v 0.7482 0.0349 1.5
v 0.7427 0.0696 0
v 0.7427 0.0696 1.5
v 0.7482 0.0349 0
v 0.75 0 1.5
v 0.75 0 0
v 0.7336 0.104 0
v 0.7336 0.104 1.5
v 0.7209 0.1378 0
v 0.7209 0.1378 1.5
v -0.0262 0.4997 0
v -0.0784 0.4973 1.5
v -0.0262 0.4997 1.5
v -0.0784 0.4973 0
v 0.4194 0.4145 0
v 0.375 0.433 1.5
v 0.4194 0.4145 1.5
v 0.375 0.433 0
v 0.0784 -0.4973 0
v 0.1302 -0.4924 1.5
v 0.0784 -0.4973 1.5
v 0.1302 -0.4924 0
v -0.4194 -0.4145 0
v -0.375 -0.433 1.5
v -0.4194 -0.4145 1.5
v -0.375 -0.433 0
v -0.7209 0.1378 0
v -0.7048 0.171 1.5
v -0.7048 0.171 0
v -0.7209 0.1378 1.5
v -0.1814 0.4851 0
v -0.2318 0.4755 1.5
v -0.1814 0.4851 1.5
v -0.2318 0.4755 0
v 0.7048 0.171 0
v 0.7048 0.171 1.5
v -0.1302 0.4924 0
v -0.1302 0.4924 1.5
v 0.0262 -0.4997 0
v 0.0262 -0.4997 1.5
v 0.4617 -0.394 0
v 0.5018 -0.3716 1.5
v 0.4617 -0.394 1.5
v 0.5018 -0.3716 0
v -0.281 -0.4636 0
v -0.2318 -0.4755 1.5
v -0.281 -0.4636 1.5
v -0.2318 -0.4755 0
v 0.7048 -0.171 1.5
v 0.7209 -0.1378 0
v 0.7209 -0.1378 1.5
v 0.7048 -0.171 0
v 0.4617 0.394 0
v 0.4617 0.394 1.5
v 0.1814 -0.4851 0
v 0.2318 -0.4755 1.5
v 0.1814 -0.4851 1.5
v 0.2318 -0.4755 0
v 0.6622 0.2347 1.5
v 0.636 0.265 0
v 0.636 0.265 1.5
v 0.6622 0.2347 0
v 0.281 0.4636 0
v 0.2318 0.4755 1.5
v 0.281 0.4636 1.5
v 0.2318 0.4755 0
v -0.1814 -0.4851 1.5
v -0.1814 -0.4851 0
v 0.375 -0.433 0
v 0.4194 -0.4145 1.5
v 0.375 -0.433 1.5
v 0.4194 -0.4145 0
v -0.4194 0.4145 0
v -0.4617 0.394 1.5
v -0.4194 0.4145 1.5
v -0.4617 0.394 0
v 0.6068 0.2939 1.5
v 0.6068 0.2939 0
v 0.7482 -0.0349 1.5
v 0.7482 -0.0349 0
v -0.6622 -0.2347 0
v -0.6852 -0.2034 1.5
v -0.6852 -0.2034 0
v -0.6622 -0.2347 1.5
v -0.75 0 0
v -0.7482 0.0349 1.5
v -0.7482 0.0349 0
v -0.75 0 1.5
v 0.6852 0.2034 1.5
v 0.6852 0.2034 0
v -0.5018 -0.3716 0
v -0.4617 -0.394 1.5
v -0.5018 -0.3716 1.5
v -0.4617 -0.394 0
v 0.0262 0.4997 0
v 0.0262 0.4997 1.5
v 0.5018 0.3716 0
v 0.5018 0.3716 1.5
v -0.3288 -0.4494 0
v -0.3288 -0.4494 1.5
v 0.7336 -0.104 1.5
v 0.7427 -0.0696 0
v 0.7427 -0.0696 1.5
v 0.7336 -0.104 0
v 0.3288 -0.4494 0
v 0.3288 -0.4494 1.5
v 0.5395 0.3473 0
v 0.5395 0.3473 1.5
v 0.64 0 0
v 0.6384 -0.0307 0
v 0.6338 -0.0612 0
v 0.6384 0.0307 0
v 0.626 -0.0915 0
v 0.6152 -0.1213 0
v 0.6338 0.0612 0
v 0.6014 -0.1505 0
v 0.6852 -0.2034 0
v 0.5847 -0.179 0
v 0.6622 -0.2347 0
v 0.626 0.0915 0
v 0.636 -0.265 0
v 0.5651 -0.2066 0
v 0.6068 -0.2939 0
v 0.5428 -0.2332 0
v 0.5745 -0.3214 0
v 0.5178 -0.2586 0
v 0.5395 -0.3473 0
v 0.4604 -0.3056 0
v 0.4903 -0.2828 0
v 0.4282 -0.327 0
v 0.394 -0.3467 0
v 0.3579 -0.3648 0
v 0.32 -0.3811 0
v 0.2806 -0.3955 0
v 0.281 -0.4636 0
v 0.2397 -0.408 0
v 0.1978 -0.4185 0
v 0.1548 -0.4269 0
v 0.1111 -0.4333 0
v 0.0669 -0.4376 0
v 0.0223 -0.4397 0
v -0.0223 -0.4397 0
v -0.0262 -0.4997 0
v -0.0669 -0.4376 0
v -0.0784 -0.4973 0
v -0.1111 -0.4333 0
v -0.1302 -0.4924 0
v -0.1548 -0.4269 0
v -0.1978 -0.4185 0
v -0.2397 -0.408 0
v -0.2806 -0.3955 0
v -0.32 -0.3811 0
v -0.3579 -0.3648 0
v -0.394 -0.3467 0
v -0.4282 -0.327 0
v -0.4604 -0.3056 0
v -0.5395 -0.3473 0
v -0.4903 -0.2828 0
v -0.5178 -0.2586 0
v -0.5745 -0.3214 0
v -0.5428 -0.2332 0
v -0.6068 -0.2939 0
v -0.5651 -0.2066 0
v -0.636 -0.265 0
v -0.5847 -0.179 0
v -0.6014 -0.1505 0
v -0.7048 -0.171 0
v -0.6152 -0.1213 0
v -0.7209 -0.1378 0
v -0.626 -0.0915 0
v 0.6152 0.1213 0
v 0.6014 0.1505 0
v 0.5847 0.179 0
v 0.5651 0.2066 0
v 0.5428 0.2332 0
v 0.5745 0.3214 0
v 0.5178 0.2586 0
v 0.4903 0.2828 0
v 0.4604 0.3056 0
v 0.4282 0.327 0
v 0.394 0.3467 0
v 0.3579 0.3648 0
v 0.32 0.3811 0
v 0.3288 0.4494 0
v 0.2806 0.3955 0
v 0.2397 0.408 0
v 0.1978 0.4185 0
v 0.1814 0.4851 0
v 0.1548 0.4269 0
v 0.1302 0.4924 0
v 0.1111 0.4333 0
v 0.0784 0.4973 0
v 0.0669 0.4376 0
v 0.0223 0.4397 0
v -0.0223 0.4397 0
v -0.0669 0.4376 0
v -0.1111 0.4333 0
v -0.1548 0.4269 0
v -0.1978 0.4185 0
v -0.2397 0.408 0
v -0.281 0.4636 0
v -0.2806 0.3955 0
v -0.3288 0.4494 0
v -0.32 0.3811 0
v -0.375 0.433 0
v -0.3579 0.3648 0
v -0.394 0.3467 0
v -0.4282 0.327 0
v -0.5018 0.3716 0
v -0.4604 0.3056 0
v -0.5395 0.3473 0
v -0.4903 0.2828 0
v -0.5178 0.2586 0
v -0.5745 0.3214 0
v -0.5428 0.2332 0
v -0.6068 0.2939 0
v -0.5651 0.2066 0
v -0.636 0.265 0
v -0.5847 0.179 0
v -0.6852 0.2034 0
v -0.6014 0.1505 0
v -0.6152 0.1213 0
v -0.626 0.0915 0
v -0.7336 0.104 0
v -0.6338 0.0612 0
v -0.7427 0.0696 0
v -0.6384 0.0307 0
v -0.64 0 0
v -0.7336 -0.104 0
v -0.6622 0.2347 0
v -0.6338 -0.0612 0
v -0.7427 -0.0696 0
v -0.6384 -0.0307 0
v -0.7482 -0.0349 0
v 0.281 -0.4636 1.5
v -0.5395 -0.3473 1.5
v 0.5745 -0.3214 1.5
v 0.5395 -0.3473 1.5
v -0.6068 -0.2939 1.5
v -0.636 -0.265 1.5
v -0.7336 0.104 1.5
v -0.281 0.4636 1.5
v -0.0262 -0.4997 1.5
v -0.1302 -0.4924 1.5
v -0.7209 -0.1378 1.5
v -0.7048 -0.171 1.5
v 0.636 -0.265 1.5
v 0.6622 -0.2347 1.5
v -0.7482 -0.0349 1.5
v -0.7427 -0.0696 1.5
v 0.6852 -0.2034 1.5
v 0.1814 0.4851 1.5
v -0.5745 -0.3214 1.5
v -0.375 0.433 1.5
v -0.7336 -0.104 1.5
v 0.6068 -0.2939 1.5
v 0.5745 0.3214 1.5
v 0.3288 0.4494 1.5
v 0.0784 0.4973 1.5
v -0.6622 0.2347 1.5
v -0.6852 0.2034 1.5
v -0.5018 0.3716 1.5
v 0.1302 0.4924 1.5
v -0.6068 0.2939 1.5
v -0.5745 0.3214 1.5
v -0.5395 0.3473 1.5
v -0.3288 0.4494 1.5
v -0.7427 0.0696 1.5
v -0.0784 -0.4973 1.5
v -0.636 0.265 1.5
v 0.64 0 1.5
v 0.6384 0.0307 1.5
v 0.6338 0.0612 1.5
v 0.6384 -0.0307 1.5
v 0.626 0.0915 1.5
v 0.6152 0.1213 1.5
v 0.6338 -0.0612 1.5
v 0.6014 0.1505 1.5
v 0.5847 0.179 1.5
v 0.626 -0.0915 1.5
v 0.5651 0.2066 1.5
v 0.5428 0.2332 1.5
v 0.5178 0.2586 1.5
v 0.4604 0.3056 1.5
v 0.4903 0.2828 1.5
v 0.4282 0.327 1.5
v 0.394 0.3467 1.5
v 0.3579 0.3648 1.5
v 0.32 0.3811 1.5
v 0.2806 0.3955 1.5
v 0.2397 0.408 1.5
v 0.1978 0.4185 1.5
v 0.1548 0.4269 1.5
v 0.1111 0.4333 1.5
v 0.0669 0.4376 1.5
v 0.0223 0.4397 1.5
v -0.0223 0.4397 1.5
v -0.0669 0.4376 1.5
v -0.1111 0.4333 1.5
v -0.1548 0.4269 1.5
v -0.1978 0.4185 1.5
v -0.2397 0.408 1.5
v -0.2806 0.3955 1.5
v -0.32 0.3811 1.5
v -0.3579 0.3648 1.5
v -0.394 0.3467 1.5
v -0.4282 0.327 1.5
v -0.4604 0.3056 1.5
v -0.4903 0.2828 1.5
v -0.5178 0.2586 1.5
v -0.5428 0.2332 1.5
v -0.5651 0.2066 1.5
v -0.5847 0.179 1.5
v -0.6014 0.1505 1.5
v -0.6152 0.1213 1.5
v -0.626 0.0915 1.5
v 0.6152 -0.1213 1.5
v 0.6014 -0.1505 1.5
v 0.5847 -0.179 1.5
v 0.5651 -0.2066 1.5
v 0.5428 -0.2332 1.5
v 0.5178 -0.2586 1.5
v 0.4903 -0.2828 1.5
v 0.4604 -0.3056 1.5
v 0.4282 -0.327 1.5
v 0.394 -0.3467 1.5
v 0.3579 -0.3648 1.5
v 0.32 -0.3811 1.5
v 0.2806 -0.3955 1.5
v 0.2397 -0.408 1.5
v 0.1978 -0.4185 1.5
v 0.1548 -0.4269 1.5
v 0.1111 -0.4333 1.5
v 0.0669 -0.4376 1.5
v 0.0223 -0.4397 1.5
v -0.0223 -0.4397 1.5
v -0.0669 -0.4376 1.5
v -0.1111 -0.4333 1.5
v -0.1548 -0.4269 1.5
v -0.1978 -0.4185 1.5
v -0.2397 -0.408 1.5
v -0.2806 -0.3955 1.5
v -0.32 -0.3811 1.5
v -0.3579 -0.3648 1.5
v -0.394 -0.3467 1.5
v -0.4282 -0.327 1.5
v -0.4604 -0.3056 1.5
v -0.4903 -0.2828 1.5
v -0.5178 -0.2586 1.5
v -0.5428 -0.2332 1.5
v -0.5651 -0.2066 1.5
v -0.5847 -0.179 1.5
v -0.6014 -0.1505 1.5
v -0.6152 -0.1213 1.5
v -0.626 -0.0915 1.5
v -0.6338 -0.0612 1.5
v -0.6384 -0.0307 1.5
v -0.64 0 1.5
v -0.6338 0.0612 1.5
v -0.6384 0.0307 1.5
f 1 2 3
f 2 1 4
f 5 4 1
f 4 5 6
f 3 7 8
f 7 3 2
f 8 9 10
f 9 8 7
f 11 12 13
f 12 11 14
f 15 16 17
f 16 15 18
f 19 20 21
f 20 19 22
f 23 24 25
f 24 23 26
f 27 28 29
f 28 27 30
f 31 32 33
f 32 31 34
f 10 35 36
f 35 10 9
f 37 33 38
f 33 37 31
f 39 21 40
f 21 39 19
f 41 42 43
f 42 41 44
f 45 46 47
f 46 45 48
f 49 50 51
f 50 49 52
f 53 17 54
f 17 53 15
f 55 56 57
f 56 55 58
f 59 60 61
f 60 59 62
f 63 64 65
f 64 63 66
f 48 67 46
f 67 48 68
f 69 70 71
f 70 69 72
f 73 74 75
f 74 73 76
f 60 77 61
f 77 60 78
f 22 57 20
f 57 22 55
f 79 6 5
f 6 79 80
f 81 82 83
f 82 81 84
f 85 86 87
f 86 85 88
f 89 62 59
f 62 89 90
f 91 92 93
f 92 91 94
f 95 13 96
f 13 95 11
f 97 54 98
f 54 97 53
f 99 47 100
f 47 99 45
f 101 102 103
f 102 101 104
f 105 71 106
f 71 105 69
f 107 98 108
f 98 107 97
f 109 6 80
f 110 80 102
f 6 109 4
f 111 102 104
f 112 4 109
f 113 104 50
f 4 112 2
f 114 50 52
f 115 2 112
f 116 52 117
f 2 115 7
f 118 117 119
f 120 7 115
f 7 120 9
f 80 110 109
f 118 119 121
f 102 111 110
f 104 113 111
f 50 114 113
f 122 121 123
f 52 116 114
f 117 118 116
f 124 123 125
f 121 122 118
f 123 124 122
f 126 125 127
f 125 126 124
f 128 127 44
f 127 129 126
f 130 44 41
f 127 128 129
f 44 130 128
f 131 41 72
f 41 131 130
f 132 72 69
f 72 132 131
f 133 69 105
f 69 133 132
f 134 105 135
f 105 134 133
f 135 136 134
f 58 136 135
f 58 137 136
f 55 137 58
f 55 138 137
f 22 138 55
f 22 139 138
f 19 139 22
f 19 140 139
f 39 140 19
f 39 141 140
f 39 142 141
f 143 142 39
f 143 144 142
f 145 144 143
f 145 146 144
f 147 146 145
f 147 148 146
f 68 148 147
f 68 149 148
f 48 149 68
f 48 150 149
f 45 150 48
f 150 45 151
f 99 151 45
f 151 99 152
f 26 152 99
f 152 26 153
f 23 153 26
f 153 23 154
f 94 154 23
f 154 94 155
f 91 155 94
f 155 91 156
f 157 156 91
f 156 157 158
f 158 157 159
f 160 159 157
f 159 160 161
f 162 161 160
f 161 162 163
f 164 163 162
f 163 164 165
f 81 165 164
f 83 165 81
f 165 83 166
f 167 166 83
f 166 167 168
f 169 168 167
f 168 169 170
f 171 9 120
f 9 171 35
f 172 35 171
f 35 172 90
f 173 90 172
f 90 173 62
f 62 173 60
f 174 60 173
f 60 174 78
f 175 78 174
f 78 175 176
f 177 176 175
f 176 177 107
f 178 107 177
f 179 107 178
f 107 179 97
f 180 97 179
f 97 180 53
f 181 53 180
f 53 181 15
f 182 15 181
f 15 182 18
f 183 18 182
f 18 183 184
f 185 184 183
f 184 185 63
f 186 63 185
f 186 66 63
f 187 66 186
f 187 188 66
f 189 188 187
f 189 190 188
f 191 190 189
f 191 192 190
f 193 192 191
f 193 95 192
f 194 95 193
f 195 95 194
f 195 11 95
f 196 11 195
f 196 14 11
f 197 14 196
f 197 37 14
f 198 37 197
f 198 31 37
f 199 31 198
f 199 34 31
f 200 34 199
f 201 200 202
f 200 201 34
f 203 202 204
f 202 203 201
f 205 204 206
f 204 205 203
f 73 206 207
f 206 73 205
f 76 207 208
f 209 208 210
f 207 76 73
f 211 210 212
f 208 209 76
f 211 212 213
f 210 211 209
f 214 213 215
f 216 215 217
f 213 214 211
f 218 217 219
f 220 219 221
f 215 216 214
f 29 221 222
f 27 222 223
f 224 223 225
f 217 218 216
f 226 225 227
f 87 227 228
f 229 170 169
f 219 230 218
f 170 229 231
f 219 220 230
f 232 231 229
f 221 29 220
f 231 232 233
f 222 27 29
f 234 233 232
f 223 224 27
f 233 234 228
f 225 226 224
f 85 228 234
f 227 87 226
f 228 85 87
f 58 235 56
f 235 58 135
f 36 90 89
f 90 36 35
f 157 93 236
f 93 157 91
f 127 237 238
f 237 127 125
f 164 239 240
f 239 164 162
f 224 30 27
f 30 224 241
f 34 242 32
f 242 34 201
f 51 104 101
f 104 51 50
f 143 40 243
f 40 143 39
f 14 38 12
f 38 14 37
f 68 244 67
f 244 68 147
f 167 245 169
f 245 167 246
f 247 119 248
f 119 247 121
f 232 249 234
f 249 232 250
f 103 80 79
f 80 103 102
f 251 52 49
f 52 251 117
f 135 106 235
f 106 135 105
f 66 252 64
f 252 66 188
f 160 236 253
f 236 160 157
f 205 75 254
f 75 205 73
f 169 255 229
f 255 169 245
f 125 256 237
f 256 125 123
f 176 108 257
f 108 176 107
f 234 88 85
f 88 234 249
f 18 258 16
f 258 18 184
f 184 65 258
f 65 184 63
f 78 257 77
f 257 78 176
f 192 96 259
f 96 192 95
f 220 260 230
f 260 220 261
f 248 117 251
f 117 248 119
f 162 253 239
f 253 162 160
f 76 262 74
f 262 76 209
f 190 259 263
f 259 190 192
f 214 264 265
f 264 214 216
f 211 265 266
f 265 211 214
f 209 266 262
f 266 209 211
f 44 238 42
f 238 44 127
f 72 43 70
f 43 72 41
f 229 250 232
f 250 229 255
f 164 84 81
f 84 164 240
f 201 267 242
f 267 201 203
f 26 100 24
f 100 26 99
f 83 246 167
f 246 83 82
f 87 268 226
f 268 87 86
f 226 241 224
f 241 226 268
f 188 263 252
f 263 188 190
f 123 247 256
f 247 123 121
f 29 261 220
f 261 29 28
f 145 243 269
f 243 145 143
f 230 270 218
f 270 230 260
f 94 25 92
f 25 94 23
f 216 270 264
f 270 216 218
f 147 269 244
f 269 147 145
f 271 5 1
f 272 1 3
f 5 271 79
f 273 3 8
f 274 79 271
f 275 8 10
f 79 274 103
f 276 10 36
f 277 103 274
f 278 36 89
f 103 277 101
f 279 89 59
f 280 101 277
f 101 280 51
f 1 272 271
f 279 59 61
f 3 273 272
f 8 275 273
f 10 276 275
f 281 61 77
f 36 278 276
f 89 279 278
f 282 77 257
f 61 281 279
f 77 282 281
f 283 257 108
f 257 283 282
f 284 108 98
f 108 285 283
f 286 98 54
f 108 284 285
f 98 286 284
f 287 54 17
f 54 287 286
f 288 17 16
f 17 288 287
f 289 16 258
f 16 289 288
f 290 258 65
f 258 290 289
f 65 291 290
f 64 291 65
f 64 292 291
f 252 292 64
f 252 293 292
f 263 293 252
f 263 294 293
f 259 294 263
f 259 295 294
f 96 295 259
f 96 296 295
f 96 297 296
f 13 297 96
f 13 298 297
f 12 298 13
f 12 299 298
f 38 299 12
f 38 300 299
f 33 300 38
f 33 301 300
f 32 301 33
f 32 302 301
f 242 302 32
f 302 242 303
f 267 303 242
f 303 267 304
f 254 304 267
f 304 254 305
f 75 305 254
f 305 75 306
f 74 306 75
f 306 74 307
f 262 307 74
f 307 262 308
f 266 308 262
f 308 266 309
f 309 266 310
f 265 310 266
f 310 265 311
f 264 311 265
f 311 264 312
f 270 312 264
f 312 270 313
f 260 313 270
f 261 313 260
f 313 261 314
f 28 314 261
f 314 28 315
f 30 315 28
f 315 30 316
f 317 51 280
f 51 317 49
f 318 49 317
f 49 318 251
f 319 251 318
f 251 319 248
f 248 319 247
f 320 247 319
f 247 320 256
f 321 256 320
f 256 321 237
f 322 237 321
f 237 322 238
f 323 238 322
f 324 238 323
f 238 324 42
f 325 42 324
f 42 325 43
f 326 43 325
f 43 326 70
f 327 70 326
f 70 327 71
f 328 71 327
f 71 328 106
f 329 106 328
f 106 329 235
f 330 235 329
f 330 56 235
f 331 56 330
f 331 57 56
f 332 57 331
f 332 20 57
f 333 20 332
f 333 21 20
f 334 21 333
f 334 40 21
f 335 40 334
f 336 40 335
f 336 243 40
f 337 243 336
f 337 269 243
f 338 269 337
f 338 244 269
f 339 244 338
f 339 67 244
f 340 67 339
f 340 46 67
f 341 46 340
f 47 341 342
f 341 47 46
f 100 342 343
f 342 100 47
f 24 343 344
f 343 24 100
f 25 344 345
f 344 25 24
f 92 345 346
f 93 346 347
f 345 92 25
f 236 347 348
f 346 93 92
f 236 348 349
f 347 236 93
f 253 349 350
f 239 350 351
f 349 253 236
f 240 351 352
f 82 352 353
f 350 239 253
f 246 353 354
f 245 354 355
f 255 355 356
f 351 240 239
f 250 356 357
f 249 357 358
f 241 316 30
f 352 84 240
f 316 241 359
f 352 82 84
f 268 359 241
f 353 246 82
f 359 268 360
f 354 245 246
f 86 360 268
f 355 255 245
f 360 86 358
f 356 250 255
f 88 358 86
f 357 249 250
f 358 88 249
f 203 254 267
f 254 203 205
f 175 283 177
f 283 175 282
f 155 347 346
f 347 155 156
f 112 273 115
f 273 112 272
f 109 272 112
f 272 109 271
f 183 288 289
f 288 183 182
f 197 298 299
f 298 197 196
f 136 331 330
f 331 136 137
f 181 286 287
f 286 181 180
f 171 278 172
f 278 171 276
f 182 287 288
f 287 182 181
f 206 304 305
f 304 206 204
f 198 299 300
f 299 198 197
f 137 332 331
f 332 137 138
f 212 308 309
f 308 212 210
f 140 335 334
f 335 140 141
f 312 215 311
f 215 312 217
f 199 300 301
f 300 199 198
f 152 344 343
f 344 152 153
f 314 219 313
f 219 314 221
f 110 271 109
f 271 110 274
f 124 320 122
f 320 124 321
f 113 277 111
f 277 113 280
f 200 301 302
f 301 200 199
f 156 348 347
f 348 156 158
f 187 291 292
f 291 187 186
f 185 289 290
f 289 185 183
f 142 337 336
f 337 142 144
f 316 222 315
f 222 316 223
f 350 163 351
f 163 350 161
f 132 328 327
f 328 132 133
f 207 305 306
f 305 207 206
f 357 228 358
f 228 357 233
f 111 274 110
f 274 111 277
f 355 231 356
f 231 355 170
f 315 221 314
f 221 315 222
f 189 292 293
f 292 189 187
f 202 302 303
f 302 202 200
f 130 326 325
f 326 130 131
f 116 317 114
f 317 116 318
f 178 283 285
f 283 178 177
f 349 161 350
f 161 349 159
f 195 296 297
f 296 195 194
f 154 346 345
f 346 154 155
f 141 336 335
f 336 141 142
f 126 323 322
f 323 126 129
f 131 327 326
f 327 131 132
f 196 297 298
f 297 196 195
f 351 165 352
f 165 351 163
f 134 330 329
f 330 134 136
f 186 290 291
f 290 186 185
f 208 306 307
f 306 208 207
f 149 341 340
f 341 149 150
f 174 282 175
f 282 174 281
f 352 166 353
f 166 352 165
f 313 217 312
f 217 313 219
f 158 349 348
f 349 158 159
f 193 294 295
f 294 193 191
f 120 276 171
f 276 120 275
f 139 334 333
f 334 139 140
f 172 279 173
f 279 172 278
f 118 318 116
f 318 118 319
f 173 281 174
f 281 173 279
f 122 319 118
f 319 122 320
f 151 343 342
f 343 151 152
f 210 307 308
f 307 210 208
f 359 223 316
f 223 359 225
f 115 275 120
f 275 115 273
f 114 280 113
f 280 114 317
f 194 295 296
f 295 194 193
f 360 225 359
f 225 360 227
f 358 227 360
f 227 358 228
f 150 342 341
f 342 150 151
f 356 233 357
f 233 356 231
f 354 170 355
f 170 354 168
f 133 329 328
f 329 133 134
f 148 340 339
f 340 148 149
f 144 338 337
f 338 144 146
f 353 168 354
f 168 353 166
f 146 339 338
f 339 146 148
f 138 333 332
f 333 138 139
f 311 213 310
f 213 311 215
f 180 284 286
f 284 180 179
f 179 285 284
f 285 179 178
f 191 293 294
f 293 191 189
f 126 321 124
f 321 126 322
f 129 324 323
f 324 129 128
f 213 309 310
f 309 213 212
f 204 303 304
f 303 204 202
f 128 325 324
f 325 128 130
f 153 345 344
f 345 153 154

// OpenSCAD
// Generated by SolidPython 1.1.3 on 2024-12-04 14:49:05
$fn = 90;


difference() {
	scale(v = [1.5000000000, 1, 1]) {
		cylinder(h = 1.5000000000, r = 0.5000000000);
	}
	scale(v = [1.6000000000, 1.1000000000, 1]) {
		cylinder(h = 2, r = 0.4000000000);
	}
}
/***********************************************
*********      SolidPython code:      **********
************************************************
 
# SolidPython example code 
# Brygg Ullmer, Clemson University
# Begun 2024-10-24

from solid import *        # load in SolidPython/SCAD support code

cyl1a = cylinder(r=.5,  h=1.5); cyl1b = scale([1.5, 1,   1])(cyl1a) #cyl1b expresses the outer perimeter.  
cyl2a = cylinder(r=.4,  h=2);   cyl2b = scale([1.6, 1.1, 1])(cyl2a) #cyl2b is for cutting away the inside

outGeom = cyl1b - cyl2b #this performs the subtraction/cut, leaving an elliptical pipe 

radialSegments = 90; hdr = '$fn = %s;' % radialSegments # create a header for the export
scad_render_to_file(outGeom, 'exSolid04a.scad', file_header=hdr) # write the .scad file

### end ###

 
 
************************************************/
